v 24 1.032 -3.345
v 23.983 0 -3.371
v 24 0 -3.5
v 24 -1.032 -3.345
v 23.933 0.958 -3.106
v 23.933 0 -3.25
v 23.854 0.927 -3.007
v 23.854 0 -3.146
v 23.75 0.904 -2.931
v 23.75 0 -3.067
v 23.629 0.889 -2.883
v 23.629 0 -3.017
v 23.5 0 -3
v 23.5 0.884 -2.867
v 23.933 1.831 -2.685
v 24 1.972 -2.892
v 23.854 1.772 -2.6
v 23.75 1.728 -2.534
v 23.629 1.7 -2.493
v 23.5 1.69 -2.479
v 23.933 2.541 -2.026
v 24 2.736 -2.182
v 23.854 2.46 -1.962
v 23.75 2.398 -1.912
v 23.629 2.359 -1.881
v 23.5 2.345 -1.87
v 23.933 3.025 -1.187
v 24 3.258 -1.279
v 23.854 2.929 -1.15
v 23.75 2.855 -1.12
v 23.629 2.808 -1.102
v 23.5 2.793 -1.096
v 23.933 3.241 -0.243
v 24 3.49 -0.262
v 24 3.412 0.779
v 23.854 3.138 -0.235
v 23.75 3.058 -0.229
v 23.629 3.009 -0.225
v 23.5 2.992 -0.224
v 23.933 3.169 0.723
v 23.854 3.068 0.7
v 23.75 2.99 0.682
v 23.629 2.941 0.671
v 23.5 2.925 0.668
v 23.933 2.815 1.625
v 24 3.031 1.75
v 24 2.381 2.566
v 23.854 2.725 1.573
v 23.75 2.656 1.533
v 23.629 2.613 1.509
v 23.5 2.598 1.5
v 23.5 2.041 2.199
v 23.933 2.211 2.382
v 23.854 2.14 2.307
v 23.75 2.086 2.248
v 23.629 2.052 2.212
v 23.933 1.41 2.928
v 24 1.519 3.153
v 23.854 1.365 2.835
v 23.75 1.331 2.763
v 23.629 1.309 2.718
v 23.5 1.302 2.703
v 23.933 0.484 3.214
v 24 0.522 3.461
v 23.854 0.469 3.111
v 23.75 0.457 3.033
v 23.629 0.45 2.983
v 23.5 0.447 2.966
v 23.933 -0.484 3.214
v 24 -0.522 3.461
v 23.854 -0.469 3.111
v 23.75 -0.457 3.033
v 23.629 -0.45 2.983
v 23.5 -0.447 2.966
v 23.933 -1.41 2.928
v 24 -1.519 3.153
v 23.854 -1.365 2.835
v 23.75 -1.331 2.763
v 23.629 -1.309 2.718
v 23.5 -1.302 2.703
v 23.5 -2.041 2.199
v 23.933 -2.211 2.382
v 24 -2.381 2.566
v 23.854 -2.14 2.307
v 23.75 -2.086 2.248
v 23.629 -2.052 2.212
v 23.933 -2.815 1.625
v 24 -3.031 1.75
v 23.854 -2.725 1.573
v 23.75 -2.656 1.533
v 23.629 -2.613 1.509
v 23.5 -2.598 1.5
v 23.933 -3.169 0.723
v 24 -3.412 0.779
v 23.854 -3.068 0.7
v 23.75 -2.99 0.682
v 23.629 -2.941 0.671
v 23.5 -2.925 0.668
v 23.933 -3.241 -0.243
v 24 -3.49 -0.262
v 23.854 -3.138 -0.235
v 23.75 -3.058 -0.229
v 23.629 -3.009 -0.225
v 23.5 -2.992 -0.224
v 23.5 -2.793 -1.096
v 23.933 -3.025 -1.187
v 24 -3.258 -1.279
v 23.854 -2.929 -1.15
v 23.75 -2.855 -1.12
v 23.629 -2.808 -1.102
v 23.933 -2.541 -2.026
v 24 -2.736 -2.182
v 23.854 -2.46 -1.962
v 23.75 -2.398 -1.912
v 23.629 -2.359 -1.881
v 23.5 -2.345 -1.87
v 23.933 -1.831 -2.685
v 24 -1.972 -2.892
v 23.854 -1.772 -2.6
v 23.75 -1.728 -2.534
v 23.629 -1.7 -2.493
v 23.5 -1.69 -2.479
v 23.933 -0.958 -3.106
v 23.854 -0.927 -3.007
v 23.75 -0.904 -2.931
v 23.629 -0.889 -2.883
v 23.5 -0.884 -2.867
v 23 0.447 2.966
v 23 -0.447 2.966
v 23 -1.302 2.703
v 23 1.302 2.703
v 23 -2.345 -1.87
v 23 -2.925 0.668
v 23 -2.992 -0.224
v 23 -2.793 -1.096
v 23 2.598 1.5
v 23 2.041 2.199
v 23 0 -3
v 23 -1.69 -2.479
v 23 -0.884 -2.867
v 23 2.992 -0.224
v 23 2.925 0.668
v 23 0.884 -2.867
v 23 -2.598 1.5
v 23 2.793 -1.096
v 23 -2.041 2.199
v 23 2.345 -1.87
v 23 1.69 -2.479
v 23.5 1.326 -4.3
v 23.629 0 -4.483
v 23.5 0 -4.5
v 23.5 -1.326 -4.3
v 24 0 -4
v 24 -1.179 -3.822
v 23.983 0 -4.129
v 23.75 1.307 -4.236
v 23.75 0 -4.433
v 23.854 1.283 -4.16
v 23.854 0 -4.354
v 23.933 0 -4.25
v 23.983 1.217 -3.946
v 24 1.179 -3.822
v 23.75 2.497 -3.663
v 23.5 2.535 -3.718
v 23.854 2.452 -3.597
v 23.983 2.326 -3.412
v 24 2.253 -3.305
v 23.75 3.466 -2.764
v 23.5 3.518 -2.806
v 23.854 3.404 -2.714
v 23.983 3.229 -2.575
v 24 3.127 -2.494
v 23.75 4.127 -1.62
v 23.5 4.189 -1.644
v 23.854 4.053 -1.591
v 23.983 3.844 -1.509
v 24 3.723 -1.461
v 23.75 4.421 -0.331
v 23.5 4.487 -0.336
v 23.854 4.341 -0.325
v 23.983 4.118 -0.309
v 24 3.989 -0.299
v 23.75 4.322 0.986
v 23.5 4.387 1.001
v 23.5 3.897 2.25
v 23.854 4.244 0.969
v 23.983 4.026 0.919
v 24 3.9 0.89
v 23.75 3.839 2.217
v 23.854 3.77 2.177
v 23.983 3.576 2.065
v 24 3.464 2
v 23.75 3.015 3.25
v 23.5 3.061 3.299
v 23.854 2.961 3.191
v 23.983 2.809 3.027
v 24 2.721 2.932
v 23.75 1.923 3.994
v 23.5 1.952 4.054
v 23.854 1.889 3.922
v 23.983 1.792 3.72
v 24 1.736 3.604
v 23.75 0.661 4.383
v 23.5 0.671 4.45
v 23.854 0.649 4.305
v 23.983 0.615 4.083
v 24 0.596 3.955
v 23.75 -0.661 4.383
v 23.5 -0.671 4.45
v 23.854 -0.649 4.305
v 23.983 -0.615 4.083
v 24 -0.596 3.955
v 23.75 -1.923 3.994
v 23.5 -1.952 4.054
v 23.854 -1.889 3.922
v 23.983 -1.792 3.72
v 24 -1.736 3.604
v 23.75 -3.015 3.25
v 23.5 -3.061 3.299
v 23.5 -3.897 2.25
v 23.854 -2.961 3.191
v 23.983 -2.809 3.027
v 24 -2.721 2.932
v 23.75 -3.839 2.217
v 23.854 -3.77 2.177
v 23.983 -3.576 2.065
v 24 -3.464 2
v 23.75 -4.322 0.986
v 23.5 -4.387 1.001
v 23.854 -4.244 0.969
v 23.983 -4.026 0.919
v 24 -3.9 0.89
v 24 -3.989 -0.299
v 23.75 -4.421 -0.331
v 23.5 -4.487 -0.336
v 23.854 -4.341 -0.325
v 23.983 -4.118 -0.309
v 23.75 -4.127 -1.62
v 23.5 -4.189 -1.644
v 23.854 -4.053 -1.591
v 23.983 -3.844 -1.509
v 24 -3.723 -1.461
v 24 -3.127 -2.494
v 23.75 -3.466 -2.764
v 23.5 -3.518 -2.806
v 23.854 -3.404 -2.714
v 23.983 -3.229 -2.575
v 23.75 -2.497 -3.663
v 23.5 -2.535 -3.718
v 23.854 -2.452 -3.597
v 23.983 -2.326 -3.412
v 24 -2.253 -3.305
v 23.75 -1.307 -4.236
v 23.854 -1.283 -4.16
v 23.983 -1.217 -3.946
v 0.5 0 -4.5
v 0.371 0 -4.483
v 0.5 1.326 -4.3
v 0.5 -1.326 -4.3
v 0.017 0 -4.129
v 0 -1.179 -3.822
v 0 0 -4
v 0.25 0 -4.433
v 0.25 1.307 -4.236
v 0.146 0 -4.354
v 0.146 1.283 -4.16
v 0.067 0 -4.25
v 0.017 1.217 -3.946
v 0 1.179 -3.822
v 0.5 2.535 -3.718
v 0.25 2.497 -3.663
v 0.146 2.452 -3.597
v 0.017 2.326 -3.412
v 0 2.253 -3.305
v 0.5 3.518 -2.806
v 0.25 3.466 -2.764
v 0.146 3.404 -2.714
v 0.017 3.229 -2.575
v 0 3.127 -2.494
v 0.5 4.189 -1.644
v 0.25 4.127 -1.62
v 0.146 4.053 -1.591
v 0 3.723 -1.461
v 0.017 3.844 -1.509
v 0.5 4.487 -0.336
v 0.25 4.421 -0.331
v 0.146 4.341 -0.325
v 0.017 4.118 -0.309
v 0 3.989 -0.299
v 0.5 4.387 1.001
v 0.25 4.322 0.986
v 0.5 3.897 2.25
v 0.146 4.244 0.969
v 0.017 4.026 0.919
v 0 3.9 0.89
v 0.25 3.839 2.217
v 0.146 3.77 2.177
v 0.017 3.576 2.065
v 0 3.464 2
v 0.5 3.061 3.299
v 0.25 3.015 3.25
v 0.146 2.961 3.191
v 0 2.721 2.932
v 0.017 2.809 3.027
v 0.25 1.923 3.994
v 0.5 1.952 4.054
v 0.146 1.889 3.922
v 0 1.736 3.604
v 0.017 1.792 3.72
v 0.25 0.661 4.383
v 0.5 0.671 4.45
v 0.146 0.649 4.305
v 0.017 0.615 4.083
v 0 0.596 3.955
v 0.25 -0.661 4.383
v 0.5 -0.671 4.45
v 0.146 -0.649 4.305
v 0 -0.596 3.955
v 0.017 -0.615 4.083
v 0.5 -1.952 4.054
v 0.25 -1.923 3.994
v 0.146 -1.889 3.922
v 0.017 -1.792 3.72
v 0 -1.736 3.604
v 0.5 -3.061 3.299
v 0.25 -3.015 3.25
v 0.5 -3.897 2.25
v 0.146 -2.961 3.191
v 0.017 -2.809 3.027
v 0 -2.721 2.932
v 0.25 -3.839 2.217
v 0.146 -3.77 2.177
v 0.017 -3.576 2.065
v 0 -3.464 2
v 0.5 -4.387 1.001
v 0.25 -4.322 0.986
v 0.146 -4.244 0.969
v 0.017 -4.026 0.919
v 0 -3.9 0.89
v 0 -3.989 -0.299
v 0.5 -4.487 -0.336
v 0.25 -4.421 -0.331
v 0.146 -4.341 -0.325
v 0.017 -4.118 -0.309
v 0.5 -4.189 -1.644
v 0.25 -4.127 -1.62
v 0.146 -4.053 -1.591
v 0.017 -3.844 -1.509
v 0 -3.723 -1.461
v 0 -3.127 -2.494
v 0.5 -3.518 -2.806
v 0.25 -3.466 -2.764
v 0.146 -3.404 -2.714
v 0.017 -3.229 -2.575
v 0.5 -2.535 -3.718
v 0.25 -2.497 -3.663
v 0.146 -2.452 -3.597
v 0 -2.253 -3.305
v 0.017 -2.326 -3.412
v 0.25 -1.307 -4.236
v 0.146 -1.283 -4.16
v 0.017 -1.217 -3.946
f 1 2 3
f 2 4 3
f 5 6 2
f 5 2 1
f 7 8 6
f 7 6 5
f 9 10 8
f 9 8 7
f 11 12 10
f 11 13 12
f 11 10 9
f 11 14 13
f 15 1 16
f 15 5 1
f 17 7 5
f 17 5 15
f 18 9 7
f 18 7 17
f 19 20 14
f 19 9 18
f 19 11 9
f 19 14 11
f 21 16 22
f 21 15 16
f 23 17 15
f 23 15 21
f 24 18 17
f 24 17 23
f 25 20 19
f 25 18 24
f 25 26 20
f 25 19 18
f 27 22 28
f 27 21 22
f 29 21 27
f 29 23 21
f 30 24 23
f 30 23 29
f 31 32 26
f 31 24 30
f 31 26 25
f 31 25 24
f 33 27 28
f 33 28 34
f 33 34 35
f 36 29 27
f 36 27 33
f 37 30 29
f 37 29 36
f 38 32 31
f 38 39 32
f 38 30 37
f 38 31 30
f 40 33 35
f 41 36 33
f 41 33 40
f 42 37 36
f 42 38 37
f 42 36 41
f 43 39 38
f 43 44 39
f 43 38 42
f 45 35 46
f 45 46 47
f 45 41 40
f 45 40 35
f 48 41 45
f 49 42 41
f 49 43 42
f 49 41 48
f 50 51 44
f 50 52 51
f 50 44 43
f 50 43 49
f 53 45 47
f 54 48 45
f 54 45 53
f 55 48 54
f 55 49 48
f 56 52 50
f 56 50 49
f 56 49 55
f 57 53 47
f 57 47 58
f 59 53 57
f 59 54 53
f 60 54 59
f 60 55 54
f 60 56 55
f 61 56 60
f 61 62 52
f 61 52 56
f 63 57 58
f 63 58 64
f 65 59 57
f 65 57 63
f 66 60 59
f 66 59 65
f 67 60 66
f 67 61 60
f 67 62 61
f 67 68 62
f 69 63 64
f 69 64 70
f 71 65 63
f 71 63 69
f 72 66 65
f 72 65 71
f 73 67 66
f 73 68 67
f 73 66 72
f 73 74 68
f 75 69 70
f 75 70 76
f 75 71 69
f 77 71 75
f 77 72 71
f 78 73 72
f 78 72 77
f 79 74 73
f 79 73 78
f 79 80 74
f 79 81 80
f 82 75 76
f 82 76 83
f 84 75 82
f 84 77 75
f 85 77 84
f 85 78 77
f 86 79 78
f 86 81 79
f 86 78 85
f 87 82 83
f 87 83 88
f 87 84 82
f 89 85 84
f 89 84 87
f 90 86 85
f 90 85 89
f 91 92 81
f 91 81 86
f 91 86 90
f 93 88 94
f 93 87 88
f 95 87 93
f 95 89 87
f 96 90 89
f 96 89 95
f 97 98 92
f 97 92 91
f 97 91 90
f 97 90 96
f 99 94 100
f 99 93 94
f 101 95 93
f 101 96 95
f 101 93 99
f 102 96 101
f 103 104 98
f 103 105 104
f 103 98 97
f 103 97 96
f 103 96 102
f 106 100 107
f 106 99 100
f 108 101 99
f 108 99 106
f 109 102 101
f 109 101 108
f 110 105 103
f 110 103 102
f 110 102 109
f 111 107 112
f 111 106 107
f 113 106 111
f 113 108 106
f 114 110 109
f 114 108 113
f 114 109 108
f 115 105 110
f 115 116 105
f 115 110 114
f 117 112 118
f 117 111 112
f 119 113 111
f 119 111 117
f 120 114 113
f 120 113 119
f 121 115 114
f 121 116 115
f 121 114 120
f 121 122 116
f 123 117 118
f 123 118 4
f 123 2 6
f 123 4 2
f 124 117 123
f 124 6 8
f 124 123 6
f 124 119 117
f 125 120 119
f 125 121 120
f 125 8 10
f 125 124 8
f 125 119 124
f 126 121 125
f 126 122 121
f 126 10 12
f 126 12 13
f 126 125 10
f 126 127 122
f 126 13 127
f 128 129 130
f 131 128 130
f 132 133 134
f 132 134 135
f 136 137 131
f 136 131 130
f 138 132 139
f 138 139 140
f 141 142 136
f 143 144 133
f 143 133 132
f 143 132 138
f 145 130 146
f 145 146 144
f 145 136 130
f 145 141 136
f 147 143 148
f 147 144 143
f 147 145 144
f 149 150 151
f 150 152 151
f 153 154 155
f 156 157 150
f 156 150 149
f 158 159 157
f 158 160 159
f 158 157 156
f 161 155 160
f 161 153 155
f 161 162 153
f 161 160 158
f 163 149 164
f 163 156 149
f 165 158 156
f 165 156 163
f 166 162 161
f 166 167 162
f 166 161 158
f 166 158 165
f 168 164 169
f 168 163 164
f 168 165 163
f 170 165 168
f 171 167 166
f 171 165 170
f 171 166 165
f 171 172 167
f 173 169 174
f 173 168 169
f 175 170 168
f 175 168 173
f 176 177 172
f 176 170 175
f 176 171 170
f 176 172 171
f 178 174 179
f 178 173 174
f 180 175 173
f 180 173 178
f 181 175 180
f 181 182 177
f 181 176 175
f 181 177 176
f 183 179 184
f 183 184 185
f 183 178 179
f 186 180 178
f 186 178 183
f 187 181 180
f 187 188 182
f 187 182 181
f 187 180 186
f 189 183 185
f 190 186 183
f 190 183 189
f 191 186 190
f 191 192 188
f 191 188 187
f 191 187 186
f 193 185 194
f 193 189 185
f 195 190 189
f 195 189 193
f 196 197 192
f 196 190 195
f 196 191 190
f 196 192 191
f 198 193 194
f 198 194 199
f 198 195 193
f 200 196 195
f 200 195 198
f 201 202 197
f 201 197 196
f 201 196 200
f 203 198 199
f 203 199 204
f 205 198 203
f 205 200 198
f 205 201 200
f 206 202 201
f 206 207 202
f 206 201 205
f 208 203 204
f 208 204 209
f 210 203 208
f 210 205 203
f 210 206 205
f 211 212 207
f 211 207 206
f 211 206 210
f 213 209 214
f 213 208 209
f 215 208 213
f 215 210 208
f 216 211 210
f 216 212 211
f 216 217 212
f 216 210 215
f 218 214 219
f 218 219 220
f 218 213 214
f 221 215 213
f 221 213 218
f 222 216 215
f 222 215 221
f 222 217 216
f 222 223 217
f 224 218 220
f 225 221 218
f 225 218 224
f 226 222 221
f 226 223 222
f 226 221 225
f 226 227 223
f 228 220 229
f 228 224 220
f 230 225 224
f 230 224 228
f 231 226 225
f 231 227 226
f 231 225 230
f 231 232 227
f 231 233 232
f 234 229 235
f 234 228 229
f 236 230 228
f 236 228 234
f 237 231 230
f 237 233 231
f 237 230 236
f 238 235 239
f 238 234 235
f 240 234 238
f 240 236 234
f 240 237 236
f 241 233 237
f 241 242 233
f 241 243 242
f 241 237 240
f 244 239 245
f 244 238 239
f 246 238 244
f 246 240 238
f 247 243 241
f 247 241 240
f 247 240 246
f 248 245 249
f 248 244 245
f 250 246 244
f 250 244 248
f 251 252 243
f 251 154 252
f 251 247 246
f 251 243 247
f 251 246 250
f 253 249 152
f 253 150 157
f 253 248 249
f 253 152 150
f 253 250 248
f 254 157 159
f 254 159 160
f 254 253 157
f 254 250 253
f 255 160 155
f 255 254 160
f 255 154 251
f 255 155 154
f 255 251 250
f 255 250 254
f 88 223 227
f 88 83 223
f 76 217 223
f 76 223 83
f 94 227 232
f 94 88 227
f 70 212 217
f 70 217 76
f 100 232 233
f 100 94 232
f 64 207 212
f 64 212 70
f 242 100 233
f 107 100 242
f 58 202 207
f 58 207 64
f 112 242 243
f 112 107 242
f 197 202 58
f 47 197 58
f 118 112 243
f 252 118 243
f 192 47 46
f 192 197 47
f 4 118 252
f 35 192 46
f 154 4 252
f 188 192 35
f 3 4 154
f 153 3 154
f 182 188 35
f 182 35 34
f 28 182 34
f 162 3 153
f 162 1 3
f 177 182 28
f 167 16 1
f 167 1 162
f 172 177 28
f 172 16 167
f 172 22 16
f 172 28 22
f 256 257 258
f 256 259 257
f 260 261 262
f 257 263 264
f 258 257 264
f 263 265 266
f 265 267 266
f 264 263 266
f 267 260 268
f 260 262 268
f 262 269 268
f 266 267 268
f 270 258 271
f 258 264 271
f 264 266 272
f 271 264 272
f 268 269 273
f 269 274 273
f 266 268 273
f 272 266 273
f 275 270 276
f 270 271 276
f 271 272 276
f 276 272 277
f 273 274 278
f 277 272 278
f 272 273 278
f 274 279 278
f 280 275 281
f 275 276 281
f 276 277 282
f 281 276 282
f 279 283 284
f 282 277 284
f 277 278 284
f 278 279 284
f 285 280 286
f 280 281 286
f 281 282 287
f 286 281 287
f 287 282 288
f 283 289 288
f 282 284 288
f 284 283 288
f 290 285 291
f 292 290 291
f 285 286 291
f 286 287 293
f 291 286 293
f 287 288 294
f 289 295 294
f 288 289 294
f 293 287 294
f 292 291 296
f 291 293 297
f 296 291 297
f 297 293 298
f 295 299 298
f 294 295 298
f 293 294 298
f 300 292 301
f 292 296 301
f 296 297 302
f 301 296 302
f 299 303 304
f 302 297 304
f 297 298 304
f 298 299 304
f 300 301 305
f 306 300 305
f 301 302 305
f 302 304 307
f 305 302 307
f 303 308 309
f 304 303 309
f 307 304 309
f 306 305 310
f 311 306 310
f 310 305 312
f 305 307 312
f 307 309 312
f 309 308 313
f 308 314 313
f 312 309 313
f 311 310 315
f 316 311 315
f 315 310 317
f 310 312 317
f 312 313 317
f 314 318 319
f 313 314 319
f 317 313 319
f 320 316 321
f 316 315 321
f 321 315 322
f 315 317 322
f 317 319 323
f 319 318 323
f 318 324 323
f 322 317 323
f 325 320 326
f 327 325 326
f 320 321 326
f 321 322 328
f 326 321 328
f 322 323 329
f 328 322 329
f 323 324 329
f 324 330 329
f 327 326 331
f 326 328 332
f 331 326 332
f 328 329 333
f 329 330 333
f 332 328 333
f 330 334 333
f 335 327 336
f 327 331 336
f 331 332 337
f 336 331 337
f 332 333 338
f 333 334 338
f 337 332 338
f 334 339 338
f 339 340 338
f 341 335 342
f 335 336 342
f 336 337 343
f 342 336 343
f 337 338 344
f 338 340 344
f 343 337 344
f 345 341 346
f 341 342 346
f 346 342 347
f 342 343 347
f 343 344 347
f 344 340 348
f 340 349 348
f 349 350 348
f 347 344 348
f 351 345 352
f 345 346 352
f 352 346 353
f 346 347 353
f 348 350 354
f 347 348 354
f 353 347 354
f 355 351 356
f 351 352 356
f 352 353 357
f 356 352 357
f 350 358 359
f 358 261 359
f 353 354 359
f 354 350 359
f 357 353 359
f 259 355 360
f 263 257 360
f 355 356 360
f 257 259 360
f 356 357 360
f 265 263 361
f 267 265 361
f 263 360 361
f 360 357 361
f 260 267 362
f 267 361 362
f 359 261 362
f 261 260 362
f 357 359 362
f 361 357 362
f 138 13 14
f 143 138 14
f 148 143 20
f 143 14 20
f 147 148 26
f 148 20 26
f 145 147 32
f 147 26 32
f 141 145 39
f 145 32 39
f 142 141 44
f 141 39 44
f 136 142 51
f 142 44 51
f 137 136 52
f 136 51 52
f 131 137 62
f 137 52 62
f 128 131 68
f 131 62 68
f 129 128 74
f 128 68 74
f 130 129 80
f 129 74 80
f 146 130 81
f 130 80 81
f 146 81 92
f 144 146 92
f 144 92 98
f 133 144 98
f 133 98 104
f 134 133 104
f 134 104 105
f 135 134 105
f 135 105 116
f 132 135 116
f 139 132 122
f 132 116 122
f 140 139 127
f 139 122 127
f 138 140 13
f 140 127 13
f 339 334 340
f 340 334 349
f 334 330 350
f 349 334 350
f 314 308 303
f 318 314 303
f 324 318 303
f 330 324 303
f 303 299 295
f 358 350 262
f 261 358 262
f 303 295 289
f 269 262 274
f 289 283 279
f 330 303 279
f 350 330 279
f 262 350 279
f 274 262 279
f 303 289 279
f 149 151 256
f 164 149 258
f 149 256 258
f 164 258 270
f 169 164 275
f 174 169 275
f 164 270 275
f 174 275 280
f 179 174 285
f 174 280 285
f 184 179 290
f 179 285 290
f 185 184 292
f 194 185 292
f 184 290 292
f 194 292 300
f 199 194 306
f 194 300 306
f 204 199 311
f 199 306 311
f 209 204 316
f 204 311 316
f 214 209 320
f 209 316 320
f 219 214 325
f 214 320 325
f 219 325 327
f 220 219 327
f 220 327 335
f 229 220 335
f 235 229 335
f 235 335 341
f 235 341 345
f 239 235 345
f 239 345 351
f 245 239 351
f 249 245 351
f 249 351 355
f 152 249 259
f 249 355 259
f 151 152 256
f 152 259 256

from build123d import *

# Parameters (mm, degrees)
SKETCH1_R      = 4.5
EXTRUDE1_DEPTH = 24
FILLET1_R      = 0.5
SKETCH2_R      = 3
EXTRUDE2_DEPTH = 1
FILLET2_R      = 0.5


with BuildPart() as part:
    # Sketch1 → Extrude1 (new body)
    with BuildSketch(Plane(origin=(0, 0, 0), x_dir=(0, 0, -1), z_dir=(1, 0, 0))):
        Circle(SKETCH1_R)
    extrude(amount=EXTRUDE1_DEPTH)

    # Fillet1
    fillet1_edges = [part.edges().sort_by_distance(p)[0] for p in [
        (0, 0, 4.5),
    ]]
    fillet(fillet1_edges, radius=FILLET1_R)

    # Sketch2 → Extrude2 (cut)
    with BuildSketch(Plane(origin=(24, 0, 0), x_dir=(0, 0, -1), z_dir=(1, 0, 0))):
        Circle(SKETCH2_R)
    extrude(amount=-EXTRUDE2_DEPTH, mode=Mode.SUBTRACT)

    # Fillet2
    fillet2_edges = [part.edges().sort_by_distance(p)[0] for p in [
        (24, 0, 4.5),
        (24, 0, 3),
    ]]
    fillet(fillet2_edges, radius=FILLET2_R)


solid = part.part
